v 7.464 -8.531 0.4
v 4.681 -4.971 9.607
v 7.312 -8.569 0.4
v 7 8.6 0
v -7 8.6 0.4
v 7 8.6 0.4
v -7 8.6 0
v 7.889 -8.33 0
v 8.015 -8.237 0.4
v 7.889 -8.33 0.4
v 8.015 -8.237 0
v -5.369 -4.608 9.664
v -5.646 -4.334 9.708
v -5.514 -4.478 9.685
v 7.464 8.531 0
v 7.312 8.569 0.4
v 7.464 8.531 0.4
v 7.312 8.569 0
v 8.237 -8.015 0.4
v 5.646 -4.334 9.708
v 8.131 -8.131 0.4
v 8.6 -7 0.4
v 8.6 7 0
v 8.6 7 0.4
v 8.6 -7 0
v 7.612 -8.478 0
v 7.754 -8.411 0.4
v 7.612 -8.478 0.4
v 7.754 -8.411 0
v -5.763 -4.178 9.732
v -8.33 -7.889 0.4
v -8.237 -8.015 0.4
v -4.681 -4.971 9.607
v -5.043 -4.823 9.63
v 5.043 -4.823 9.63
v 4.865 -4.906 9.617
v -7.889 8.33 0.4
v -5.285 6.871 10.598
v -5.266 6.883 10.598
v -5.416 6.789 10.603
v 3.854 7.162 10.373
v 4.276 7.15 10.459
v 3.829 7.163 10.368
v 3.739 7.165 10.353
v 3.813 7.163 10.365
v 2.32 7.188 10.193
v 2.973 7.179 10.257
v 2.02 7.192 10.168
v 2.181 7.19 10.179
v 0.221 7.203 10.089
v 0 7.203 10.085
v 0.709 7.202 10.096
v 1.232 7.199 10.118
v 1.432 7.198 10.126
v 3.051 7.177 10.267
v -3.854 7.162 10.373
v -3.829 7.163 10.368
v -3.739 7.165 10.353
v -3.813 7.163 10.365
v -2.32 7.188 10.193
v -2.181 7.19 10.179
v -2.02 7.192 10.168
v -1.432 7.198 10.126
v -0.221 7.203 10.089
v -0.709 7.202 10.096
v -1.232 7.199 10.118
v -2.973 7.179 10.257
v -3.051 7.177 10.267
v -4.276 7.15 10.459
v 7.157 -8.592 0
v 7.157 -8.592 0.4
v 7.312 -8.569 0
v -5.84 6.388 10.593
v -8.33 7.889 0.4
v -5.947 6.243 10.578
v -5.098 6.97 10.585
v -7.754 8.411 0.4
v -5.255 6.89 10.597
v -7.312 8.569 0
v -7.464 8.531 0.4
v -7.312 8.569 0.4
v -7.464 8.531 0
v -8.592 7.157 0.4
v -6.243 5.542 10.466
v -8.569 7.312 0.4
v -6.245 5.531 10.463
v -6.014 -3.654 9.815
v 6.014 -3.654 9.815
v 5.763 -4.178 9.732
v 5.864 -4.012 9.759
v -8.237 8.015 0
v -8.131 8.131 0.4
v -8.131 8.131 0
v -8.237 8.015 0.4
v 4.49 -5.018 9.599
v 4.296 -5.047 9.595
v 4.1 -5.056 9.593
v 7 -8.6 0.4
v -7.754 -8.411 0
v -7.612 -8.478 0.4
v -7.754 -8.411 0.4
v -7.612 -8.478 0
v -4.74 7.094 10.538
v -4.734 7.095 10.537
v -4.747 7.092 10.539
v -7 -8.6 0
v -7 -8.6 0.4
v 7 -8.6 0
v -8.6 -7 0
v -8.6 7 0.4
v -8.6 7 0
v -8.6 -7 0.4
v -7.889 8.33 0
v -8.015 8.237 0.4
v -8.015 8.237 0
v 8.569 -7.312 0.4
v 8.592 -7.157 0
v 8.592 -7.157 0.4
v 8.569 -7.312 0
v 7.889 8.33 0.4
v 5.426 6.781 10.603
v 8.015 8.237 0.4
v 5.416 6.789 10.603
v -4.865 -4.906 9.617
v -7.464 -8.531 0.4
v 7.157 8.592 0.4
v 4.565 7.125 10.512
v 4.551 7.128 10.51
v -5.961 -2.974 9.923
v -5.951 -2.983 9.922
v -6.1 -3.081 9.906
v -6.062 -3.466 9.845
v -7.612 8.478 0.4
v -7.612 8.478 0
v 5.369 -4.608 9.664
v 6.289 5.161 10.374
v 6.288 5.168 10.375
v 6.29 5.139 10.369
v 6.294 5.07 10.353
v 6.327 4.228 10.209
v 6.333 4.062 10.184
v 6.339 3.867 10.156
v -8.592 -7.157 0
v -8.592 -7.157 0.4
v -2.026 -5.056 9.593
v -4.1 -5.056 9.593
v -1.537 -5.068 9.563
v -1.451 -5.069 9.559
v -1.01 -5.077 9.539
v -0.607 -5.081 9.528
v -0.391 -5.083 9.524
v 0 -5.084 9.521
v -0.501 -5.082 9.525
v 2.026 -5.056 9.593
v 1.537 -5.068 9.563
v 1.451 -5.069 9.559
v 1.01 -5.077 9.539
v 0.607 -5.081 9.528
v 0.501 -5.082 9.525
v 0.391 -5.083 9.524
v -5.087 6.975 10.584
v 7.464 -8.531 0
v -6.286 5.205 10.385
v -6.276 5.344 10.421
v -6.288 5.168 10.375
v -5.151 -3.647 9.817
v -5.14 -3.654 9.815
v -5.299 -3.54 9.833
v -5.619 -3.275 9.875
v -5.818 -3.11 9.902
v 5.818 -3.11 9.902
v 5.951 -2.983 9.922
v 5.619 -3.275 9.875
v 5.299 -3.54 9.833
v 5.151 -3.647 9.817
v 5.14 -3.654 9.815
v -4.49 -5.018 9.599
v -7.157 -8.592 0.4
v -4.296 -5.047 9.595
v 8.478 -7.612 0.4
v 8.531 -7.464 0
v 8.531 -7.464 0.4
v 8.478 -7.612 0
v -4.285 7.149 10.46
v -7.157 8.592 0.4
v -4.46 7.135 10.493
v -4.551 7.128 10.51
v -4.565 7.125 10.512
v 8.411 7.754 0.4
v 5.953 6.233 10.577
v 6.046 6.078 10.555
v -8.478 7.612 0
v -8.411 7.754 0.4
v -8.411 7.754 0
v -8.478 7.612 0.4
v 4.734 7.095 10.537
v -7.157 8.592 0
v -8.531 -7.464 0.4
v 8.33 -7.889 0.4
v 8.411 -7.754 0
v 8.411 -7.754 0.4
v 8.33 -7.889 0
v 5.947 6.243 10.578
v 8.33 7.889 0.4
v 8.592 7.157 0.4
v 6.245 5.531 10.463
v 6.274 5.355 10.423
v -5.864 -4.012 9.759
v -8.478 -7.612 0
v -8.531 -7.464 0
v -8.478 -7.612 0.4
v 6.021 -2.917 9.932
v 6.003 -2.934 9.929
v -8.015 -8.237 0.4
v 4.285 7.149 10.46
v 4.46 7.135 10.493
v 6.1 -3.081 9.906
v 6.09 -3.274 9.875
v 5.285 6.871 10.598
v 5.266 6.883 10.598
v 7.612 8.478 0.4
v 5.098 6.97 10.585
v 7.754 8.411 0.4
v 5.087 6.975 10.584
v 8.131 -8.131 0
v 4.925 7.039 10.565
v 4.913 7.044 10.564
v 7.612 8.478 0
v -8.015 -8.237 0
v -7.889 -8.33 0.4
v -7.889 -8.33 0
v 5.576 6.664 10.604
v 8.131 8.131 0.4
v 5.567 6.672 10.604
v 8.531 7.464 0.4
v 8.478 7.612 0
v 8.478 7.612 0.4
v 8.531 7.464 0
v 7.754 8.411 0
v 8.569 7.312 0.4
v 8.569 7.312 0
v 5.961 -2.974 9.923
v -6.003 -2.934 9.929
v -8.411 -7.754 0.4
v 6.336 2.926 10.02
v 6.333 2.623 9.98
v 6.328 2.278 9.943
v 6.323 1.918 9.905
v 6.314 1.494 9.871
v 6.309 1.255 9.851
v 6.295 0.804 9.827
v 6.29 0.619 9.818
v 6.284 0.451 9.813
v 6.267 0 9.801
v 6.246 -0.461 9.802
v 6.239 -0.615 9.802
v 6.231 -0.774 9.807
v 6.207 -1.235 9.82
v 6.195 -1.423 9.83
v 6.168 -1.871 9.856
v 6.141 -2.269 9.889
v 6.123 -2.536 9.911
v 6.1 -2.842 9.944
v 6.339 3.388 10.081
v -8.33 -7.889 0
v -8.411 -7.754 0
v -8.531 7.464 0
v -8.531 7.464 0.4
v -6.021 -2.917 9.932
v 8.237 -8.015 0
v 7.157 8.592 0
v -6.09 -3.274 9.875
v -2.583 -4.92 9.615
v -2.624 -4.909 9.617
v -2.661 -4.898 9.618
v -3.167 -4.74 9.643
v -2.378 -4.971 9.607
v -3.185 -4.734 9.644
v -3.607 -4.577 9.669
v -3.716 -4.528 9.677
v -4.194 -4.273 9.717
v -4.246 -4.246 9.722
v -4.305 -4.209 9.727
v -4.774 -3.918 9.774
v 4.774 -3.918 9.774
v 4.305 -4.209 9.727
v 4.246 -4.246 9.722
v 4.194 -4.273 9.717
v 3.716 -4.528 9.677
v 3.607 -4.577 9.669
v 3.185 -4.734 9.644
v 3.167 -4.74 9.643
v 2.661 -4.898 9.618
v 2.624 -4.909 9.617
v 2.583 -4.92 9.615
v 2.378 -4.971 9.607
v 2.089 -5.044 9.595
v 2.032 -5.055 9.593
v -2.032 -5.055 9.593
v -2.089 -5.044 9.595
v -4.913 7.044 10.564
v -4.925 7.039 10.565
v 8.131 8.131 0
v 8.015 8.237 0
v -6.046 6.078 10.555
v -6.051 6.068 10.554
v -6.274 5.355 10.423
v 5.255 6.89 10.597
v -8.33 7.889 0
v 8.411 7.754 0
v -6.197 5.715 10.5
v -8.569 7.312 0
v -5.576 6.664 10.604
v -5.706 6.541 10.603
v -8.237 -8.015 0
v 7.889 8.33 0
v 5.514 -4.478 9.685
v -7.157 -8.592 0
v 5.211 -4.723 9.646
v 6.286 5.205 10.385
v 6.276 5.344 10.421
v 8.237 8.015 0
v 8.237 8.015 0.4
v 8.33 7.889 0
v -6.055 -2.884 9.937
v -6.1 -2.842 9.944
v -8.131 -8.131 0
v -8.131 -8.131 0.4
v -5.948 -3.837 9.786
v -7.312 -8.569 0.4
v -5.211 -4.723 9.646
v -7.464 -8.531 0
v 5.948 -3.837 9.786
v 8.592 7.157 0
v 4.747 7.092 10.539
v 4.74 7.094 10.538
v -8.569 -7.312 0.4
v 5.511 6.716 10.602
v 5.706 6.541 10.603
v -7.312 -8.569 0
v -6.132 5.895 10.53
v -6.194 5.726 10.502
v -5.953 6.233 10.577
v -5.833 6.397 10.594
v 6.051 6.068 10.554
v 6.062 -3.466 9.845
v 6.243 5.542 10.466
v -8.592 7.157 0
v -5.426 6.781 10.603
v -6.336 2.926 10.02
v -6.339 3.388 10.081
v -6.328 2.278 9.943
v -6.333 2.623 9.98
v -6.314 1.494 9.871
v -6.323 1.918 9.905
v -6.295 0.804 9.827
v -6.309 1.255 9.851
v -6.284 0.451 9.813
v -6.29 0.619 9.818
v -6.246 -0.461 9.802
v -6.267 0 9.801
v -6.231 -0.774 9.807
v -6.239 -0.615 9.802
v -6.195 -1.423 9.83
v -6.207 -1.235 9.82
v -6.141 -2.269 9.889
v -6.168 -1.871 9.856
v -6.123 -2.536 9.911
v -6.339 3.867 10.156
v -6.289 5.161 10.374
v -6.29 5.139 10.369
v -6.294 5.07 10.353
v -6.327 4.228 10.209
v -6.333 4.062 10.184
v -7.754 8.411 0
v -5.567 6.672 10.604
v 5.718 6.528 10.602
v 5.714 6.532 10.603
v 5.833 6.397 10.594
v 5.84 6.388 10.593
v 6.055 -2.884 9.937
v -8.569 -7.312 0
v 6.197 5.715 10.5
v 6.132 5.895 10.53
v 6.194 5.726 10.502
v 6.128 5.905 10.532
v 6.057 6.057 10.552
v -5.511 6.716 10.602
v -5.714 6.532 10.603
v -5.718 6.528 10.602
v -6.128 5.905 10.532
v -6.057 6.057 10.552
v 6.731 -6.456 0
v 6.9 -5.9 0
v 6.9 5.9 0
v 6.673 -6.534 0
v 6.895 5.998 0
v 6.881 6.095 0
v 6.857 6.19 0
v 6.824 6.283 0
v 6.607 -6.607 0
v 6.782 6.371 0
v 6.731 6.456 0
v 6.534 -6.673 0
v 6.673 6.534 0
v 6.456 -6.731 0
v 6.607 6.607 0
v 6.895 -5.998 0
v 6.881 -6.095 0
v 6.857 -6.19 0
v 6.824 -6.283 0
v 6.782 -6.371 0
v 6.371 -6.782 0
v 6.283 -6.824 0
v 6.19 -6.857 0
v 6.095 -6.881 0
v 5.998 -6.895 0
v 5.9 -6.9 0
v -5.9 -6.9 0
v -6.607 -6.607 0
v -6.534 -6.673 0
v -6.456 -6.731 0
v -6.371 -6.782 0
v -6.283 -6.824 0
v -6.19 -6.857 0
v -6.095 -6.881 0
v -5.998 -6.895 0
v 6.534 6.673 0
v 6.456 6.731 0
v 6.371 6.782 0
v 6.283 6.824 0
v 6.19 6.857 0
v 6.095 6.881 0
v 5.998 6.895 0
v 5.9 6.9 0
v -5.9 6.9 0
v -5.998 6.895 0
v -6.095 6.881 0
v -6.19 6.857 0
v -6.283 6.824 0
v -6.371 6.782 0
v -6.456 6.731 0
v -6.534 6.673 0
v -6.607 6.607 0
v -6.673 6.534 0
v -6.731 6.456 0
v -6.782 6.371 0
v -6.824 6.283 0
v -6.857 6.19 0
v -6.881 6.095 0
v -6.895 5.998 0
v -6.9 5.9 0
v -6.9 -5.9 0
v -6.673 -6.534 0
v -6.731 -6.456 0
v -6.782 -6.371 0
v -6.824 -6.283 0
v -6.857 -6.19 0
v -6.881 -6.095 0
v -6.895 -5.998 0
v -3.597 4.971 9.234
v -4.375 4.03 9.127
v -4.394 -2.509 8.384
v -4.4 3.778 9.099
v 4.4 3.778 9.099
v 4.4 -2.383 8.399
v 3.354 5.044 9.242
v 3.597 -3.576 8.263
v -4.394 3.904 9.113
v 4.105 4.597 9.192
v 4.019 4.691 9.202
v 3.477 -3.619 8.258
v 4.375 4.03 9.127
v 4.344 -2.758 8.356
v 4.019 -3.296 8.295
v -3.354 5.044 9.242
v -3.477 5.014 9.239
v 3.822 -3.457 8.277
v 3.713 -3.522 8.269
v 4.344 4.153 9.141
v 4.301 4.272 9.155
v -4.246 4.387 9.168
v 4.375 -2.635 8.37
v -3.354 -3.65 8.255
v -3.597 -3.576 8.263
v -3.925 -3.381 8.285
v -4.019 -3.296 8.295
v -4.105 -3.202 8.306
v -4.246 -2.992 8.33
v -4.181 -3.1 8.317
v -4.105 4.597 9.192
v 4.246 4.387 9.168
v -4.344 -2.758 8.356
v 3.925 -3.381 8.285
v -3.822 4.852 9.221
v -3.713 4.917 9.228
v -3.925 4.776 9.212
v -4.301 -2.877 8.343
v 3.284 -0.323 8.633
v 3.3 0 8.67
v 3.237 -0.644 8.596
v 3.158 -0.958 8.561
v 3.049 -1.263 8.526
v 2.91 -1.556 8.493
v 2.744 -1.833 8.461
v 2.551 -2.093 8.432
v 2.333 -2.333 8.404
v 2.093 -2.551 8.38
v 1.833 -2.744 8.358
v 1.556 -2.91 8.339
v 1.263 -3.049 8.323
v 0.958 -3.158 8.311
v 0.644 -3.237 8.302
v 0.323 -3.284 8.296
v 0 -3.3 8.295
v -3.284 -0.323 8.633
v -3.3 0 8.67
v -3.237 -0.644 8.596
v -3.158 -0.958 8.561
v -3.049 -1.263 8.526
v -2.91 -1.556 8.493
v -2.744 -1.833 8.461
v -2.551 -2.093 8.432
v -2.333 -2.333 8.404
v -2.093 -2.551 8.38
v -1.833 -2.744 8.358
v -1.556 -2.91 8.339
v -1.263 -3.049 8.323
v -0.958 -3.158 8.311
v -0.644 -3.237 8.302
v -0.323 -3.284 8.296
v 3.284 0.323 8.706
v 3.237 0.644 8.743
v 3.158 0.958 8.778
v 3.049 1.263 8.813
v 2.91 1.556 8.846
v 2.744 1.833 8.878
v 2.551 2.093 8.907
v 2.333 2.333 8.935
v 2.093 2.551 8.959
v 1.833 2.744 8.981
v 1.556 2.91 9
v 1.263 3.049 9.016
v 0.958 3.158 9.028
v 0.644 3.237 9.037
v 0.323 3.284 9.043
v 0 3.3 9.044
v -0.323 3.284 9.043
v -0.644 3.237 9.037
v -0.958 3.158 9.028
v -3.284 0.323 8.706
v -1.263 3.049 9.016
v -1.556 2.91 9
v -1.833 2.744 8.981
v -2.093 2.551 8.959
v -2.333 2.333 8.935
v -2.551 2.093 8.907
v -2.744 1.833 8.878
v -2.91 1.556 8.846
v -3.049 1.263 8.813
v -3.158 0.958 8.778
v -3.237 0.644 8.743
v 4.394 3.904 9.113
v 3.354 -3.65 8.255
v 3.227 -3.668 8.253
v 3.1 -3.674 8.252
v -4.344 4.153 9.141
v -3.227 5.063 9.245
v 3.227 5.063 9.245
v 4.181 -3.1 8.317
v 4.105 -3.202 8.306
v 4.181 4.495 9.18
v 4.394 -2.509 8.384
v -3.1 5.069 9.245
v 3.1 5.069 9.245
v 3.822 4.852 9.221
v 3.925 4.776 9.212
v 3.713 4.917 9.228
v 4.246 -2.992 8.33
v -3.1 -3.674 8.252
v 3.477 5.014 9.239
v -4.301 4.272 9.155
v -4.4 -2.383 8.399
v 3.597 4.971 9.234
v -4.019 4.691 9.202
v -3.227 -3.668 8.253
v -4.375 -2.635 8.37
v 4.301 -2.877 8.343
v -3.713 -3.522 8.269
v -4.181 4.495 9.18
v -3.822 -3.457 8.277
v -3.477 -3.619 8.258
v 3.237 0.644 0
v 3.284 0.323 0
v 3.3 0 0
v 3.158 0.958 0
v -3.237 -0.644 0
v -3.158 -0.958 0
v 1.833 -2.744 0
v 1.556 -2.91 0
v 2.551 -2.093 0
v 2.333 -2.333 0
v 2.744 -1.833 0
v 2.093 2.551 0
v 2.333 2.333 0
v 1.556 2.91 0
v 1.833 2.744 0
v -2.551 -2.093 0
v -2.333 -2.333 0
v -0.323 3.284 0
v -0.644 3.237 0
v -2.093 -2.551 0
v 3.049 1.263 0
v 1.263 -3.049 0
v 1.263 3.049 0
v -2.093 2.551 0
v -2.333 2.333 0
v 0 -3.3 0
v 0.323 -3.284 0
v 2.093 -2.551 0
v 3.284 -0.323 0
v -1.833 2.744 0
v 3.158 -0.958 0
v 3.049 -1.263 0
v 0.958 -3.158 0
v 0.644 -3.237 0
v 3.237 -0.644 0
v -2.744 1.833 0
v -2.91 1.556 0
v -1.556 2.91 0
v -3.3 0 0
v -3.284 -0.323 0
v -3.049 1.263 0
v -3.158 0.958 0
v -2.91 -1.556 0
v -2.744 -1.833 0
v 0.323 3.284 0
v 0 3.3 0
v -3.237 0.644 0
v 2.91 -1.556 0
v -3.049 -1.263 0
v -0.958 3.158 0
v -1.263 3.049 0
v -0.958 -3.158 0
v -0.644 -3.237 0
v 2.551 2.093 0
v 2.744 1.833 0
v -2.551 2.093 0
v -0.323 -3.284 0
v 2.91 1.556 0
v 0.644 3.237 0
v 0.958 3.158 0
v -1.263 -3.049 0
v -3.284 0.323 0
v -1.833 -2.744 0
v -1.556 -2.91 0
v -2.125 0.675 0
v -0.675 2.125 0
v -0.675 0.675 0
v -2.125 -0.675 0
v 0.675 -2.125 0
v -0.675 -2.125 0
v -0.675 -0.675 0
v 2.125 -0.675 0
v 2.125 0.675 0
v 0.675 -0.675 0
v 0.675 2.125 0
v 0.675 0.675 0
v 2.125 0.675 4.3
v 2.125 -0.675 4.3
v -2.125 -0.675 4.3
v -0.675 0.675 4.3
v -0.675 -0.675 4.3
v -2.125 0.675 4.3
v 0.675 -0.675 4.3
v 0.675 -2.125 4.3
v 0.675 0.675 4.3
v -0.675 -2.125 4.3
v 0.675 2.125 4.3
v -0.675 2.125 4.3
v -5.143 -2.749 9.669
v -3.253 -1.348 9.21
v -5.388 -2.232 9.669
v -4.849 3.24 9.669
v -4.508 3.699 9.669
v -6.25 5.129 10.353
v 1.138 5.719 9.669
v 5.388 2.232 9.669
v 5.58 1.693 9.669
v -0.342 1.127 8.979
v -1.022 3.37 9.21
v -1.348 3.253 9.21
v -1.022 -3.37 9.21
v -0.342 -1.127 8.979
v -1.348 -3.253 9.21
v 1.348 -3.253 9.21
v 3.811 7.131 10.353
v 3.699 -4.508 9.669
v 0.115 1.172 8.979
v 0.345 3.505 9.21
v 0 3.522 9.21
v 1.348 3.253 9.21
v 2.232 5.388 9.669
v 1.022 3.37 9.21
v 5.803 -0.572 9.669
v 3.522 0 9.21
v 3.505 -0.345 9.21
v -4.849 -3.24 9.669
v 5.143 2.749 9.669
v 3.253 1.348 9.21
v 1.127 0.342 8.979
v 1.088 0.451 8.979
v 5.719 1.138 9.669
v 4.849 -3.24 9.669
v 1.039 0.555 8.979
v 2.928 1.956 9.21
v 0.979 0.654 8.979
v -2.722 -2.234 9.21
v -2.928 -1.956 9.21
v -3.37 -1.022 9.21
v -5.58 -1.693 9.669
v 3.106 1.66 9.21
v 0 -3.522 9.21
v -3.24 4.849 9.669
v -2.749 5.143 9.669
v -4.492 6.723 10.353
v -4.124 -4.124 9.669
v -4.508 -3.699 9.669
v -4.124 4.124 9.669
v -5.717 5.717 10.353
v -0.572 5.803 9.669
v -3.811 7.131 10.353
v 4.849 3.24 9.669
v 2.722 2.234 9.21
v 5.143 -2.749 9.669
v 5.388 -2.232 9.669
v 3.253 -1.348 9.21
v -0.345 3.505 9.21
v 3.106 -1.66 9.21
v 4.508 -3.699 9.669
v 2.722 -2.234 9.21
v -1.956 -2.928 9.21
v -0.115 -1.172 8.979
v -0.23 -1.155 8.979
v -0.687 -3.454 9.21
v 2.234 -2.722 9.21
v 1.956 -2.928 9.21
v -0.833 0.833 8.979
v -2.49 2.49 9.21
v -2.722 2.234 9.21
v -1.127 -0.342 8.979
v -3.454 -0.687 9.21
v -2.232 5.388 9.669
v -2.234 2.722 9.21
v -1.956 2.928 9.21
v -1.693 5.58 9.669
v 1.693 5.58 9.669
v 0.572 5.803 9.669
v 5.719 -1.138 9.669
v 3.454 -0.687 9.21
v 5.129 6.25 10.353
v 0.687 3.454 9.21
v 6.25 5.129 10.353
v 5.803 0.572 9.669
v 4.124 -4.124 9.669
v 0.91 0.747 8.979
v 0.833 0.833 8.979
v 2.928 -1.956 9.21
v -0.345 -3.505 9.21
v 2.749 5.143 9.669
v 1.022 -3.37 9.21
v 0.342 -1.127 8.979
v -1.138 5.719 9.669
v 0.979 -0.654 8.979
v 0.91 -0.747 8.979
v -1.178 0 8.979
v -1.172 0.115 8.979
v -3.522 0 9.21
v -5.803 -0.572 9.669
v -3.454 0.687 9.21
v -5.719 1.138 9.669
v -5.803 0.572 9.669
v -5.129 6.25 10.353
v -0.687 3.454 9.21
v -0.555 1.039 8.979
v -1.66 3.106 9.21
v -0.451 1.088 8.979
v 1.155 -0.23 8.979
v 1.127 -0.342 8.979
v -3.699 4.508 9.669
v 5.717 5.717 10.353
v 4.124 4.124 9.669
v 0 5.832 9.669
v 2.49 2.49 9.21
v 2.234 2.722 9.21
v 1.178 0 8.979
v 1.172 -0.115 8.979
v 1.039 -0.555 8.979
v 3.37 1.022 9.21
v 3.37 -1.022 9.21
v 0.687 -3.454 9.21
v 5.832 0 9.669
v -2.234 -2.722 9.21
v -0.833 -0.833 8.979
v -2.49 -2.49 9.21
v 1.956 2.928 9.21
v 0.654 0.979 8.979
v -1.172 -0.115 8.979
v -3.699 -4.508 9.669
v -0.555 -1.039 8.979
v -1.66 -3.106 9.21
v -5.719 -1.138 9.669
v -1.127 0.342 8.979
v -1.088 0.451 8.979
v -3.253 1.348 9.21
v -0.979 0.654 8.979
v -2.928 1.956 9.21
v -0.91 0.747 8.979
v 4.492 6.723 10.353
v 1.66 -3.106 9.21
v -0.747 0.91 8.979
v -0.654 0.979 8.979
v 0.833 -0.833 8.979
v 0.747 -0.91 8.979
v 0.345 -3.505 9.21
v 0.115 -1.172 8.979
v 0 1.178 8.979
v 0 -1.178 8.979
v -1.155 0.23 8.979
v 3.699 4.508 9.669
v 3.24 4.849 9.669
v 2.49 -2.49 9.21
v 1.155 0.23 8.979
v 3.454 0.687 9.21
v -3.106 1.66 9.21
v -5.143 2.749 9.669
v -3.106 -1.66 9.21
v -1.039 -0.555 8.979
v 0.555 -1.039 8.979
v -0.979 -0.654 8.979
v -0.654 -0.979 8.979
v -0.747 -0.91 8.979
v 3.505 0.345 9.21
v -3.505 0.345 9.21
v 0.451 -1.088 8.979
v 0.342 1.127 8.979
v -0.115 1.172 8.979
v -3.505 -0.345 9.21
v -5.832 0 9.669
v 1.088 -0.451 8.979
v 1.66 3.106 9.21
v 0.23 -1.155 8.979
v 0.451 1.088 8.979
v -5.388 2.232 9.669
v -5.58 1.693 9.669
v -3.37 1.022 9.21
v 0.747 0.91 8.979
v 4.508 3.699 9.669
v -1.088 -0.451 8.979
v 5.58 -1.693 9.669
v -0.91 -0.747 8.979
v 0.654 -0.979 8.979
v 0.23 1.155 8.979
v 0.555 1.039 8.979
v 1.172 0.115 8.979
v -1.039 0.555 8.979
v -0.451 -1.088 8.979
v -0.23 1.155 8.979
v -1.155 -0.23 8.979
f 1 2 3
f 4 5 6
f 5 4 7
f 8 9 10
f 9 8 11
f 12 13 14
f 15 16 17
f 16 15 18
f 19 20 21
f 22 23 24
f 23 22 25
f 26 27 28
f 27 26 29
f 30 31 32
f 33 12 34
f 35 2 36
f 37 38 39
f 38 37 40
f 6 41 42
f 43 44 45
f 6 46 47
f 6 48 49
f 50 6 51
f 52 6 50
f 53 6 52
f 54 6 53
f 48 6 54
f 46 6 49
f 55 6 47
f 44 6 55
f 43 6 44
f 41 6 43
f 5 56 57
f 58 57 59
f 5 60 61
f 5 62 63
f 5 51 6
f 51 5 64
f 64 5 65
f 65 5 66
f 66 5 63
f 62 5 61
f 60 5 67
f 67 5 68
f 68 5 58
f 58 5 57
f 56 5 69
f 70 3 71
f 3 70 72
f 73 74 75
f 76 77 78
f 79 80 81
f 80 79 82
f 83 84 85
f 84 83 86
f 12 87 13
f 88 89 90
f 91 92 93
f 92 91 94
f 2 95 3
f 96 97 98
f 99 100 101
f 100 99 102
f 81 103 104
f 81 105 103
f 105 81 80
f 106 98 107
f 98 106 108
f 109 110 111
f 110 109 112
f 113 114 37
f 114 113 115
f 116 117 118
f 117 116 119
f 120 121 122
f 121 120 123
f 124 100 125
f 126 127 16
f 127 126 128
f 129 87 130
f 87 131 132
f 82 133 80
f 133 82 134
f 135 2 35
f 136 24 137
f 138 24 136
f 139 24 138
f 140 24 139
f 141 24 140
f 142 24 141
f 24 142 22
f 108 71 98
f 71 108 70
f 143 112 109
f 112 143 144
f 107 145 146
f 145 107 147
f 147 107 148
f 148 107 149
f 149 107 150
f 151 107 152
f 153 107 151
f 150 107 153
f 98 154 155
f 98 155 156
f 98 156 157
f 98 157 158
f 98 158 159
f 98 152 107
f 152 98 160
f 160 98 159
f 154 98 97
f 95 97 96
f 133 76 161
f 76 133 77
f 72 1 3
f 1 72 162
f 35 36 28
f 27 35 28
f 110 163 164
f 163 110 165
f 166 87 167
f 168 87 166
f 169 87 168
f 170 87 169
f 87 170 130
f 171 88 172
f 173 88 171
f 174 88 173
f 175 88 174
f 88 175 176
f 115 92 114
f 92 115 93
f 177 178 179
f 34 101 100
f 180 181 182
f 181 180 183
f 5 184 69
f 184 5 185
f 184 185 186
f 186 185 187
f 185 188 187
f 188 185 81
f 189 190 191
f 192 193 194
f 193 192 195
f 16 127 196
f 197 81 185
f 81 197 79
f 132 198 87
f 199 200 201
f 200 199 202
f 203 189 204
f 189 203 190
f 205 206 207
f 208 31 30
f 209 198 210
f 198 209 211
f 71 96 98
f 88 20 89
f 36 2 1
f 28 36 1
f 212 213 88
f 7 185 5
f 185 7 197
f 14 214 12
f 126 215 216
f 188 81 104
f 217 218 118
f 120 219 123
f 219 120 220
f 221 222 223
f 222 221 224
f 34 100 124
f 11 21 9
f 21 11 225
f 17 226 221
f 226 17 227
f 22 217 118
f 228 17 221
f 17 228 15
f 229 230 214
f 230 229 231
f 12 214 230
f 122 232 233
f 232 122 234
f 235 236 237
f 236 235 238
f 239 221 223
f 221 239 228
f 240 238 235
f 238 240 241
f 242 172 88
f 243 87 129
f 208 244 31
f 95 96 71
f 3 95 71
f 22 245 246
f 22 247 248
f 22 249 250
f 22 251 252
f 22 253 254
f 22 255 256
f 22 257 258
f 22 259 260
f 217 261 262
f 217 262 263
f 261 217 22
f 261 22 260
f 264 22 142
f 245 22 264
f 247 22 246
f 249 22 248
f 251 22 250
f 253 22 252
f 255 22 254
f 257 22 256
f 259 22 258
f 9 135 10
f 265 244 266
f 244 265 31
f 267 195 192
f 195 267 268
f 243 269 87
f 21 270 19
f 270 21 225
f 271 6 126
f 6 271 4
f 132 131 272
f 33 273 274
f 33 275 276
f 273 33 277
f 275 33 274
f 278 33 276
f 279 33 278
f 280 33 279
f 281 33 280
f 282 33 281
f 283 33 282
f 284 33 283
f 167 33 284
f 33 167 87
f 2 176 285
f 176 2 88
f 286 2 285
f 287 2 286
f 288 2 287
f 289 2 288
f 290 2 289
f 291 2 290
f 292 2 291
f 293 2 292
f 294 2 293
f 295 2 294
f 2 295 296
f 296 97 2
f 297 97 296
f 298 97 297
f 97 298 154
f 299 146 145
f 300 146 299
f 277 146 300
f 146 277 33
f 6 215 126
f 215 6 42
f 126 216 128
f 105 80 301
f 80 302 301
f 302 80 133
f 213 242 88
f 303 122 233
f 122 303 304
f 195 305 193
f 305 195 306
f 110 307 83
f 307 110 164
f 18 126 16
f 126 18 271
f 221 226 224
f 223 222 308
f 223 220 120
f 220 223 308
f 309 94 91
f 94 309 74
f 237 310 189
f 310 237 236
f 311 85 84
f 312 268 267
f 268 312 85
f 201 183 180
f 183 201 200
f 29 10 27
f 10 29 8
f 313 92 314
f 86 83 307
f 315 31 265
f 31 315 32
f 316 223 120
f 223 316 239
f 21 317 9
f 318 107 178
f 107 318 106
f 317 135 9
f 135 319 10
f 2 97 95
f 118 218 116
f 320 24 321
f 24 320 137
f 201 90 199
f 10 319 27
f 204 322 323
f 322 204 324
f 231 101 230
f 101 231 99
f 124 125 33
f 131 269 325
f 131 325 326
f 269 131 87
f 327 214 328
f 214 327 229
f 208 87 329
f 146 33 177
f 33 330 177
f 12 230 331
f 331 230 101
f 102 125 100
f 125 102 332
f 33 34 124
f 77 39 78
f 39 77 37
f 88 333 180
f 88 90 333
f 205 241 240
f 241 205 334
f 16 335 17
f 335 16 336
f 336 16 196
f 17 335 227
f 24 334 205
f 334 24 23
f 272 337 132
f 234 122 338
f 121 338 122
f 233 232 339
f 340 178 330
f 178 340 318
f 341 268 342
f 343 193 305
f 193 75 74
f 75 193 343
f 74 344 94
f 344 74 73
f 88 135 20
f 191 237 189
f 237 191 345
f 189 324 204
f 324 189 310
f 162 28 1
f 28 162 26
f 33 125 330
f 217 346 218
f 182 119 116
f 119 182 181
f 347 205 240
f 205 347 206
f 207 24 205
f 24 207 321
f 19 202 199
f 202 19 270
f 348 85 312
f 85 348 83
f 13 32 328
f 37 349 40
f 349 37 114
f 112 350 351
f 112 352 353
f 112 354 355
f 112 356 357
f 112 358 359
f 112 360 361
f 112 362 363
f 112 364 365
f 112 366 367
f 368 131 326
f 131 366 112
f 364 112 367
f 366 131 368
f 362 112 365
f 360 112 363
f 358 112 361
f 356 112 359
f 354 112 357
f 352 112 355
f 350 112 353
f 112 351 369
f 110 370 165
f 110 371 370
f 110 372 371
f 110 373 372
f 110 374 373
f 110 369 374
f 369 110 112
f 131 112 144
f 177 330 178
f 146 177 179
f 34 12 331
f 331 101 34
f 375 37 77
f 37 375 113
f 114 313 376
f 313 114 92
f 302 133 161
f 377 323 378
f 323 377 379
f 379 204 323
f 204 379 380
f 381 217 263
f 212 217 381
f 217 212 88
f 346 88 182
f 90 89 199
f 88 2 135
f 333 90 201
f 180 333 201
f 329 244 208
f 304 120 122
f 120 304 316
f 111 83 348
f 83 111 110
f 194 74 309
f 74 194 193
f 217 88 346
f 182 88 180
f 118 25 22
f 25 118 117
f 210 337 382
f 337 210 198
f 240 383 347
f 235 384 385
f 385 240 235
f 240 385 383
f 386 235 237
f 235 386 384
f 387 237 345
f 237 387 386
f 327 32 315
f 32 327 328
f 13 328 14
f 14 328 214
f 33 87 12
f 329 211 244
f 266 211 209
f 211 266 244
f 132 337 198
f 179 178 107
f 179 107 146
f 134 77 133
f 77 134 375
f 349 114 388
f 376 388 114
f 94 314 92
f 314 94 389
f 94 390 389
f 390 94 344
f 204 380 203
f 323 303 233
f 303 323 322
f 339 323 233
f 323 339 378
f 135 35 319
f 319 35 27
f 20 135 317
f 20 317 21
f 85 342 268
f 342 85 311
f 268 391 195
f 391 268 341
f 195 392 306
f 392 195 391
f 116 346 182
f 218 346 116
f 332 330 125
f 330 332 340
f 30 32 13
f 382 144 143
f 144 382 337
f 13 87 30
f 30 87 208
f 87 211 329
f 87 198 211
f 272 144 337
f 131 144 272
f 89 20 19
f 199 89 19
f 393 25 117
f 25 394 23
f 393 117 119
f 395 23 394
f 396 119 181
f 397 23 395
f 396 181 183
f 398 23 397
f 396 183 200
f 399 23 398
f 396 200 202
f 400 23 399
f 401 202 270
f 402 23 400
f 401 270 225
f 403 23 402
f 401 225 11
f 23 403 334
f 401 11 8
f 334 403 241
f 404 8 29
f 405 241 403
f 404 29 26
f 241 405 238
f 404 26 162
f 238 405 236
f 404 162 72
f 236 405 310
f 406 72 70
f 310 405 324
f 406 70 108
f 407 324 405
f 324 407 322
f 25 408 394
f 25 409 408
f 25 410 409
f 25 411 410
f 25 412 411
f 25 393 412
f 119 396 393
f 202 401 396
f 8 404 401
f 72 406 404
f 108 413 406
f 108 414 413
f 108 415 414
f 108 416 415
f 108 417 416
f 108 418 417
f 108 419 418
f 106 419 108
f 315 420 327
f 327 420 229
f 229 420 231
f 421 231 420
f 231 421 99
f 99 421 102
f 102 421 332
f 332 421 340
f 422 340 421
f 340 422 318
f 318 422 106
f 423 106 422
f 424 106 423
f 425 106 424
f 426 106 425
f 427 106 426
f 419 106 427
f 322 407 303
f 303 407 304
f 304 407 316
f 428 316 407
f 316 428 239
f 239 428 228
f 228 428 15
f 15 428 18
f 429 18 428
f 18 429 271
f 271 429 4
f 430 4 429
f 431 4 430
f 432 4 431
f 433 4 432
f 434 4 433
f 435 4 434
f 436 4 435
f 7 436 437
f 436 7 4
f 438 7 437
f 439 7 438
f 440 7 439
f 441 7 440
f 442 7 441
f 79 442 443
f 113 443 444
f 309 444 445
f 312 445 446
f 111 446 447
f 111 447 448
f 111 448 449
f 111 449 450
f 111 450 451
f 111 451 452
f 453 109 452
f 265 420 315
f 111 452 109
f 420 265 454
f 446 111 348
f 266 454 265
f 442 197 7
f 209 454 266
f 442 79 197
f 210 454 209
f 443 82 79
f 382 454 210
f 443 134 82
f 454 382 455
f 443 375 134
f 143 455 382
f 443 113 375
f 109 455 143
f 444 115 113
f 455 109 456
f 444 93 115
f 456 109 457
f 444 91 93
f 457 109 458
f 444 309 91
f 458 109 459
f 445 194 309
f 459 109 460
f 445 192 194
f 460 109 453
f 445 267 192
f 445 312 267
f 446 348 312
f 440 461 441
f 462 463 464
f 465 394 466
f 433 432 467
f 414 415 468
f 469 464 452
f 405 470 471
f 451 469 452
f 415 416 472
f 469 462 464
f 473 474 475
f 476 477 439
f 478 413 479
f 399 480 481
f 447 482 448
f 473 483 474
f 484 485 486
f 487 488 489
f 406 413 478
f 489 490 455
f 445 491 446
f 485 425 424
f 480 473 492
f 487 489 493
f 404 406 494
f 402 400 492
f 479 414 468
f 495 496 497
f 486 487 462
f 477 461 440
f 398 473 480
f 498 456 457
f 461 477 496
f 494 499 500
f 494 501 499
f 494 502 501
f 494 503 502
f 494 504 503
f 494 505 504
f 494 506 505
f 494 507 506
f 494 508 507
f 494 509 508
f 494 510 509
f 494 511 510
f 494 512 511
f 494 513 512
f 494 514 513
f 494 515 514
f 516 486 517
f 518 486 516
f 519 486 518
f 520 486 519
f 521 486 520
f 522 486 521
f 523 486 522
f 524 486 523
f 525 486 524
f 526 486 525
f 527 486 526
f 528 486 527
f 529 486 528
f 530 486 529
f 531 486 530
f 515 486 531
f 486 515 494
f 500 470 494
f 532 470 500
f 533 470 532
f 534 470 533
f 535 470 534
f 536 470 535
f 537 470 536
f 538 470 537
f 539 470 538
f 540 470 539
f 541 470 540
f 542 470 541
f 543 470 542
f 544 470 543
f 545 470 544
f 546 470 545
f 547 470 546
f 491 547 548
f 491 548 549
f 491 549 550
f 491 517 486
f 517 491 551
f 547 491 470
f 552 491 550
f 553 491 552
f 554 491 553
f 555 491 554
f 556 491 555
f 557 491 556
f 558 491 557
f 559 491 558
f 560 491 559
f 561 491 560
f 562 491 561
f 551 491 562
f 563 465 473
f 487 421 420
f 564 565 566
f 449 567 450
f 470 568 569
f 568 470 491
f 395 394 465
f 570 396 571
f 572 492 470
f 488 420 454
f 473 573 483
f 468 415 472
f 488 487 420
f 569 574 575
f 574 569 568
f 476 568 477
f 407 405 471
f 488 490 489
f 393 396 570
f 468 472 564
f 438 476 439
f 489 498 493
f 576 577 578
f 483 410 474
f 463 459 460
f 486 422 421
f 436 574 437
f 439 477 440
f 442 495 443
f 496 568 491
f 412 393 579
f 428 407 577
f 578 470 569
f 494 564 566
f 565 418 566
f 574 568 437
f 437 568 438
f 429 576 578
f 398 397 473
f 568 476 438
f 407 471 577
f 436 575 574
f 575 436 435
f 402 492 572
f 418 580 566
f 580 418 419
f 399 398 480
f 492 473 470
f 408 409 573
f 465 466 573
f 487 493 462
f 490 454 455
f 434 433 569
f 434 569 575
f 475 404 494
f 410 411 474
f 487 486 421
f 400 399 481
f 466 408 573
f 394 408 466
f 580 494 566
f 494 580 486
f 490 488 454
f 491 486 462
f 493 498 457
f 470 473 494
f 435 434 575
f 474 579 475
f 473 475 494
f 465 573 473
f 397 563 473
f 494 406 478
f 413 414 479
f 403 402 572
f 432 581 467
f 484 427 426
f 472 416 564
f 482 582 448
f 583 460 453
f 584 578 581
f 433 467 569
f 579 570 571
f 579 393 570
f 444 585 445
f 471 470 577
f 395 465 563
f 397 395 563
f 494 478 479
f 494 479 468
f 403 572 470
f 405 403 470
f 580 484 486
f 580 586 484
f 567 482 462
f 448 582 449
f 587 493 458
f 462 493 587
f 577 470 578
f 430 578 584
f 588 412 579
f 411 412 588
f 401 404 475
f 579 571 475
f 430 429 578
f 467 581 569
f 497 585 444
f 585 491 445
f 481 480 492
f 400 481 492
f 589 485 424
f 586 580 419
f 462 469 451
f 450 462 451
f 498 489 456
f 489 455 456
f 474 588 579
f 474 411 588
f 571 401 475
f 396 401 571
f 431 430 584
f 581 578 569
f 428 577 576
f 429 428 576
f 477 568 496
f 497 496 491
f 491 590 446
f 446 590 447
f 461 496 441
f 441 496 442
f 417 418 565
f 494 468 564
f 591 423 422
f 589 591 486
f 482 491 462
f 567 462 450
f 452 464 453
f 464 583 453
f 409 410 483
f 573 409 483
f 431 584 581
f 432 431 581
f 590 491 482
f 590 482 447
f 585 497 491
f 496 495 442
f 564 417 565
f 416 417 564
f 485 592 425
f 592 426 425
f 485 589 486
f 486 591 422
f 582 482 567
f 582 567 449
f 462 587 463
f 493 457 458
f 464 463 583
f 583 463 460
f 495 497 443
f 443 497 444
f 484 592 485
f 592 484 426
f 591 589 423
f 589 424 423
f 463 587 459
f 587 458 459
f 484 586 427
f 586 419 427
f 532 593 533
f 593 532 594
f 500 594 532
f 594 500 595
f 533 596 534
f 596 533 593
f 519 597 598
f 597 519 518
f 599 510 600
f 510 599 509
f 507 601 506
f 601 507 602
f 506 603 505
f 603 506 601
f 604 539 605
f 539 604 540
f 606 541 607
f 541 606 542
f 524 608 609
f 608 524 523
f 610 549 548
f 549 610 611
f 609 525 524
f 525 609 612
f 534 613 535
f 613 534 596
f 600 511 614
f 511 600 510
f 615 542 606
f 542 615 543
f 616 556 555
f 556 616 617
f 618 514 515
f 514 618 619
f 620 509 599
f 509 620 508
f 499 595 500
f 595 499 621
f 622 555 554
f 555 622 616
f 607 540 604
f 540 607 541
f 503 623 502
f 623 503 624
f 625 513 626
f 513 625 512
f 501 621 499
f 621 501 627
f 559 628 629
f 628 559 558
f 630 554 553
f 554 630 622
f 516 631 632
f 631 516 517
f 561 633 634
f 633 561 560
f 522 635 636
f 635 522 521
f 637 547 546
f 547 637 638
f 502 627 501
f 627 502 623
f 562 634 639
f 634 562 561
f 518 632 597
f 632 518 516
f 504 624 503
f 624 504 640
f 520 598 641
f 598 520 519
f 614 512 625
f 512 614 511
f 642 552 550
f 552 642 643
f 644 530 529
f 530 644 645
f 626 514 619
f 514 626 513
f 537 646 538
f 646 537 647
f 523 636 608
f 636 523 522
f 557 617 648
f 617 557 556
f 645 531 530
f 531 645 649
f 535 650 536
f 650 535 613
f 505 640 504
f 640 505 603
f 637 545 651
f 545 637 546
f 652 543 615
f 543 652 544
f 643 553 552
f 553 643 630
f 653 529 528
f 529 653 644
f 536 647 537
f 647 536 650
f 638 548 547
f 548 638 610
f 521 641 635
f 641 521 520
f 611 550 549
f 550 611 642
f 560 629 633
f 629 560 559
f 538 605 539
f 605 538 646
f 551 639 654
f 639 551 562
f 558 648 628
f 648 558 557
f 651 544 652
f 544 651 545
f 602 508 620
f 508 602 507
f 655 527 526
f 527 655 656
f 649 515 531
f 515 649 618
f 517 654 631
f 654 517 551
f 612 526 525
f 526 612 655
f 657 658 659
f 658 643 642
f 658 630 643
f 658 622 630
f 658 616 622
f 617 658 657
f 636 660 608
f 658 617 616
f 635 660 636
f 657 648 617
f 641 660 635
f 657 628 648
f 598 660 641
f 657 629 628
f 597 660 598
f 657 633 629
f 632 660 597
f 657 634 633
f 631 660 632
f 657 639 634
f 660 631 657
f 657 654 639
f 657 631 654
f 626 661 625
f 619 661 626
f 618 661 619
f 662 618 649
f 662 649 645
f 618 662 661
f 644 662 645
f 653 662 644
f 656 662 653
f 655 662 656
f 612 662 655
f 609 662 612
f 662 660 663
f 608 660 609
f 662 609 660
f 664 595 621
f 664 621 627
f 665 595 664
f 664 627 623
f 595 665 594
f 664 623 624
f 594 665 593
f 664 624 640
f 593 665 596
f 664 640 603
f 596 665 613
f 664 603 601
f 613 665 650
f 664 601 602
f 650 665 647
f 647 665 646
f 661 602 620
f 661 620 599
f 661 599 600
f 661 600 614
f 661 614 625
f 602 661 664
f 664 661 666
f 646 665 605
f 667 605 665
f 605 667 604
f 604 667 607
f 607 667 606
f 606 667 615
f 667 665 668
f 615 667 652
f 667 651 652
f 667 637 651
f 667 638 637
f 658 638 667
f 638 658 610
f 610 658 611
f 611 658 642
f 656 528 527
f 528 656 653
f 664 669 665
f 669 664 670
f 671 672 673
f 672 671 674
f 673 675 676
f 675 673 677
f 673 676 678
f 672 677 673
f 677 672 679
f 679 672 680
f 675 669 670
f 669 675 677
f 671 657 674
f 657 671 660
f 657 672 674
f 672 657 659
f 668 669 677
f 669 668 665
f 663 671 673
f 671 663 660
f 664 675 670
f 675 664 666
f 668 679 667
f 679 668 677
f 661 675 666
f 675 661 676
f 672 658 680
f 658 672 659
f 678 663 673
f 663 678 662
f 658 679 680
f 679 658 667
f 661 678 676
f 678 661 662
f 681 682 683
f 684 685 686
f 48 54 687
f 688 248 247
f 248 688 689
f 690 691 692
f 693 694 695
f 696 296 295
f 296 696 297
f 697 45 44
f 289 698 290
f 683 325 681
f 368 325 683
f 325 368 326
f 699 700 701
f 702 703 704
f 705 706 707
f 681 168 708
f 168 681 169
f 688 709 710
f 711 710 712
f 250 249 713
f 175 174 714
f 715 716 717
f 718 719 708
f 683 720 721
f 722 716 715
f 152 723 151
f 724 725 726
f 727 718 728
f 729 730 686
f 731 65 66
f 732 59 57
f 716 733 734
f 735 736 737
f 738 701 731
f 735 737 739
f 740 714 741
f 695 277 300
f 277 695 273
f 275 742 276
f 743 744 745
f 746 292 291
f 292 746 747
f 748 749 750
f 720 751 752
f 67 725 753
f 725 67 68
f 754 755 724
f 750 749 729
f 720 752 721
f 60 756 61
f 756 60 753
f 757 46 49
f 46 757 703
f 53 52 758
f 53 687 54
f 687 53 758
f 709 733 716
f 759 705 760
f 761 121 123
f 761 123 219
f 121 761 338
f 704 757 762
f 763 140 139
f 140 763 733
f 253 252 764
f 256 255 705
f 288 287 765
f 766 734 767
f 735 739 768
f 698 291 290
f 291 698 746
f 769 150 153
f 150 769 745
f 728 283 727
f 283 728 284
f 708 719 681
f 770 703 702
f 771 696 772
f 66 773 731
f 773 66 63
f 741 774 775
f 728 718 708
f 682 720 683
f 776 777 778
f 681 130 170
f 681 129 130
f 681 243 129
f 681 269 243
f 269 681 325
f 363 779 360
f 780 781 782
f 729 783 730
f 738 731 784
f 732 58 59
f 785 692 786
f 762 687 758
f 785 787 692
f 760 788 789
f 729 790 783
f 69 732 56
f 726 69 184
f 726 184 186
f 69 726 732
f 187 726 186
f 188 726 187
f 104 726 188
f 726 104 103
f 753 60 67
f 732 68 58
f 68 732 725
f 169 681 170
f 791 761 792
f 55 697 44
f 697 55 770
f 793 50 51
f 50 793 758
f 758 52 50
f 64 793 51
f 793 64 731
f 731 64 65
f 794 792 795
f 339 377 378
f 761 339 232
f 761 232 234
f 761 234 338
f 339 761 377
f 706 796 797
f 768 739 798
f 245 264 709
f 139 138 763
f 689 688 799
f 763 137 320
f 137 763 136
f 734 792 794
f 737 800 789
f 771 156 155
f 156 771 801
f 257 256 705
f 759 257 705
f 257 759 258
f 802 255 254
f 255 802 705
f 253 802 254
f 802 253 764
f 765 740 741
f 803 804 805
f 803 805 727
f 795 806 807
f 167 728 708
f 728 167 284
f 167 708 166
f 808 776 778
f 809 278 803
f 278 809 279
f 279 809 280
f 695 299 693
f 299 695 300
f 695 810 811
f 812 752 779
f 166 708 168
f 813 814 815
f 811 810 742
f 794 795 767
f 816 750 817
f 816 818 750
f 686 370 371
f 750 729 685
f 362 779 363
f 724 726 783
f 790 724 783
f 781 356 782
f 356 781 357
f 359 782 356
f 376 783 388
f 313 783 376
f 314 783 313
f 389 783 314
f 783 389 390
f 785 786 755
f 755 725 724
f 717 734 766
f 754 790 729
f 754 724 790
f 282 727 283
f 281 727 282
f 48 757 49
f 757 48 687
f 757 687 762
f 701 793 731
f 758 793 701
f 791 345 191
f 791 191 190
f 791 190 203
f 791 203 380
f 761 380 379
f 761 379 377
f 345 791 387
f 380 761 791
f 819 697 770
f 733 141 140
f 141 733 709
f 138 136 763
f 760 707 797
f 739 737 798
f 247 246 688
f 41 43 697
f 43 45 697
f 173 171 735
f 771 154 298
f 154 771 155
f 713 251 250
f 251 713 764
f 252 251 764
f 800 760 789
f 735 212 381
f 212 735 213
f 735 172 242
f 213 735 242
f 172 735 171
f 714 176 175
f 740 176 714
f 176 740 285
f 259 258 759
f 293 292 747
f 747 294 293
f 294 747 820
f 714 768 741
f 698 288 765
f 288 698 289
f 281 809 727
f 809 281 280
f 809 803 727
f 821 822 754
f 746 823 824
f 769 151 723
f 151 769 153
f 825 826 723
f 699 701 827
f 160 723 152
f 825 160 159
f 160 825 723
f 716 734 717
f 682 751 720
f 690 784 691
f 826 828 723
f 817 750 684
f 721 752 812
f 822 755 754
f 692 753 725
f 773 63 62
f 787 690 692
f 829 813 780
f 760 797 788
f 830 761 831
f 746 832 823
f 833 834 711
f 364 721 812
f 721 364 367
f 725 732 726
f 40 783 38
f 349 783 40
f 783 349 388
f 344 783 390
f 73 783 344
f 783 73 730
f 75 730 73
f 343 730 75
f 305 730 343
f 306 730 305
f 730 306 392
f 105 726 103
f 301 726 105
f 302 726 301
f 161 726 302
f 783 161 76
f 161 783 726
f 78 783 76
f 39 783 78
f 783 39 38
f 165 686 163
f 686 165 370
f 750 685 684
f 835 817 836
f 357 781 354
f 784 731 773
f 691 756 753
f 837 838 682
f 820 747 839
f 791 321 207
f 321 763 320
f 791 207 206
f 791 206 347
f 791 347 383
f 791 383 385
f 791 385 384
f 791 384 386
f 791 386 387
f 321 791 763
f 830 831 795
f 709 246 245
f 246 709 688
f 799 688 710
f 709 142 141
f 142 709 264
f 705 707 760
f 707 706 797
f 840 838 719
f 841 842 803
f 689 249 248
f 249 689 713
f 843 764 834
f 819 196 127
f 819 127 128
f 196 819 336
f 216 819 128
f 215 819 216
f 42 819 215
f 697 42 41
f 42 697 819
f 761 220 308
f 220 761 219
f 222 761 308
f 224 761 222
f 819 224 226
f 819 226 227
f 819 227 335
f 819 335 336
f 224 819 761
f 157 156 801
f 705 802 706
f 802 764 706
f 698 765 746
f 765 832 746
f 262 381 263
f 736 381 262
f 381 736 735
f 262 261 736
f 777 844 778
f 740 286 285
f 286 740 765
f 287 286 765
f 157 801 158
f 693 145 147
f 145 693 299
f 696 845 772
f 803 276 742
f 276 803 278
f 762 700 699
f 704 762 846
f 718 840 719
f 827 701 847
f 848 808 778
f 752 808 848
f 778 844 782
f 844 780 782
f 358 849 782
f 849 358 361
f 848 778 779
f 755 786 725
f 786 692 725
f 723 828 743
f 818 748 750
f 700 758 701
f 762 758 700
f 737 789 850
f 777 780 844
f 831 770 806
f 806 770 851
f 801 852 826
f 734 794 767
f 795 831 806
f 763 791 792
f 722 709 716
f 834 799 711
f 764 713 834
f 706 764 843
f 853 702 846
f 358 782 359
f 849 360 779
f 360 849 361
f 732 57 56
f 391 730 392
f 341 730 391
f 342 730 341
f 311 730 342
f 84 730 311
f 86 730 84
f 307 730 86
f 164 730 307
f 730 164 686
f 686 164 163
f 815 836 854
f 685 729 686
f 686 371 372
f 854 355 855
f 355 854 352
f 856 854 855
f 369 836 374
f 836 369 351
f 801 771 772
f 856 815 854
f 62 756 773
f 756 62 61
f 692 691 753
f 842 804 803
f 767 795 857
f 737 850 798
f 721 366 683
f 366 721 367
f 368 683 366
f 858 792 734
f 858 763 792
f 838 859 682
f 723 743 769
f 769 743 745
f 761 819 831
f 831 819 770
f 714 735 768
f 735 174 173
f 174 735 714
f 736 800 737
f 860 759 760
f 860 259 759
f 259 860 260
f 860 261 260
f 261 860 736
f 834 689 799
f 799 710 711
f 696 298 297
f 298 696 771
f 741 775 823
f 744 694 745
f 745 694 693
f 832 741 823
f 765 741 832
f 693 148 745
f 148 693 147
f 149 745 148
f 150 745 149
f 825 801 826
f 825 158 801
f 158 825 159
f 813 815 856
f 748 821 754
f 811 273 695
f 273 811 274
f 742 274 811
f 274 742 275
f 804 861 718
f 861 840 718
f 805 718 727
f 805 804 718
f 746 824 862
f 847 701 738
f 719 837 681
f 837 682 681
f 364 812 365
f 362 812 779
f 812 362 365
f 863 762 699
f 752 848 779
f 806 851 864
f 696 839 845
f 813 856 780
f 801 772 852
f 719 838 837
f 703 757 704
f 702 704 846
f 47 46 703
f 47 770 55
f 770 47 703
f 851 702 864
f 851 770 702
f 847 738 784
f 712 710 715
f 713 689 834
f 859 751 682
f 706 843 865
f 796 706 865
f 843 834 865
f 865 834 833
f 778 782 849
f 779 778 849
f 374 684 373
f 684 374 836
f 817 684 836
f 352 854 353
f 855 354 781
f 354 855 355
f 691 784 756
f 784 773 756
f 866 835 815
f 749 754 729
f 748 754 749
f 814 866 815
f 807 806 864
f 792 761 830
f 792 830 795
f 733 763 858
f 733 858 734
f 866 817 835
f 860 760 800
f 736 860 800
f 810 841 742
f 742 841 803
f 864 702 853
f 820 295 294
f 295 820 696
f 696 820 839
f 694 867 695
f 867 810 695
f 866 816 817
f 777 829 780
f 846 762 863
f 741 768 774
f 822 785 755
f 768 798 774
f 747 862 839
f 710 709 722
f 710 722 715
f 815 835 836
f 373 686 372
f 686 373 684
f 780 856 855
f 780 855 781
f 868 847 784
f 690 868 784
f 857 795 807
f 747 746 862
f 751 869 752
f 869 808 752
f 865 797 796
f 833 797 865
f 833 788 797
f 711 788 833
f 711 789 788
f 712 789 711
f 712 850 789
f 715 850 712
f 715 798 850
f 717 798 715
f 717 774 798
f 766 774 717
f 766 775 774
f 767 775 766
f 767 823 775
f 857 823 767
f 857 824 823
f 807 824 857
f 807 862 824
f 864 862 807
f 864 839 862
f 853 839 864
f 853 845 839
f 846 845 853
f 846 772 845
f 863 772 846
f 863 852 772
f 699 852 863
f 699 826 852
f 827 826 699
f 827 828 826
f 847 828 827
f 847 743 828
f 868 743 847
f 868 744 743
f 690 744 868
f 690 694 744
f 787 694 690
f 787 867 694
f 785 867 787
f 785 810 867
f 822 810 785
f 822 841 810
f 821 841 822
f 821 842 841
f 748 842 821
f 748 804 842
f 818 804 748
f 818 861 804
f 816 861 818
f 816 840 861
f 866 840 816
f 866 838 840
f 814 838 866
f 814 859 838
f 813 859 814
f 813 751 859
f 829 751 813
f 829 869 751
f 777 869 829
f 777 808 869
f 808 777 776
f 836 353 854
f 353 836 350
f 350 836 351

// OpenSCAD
$fn=64;
profile="top";

module rr2d(w,d,r){ offset(r=r) square([w-2*r,d-2*r],center=true); }
module slab(w,d,r,z,shift=0,ang=0,t=0.35){
  translate([0,shift,z]) rotate([ang,0,0]) linear_extrude(height=t,center=true) rr2d(w,d,r);
}
module frustum(bw,bd,tw,td,br,tr,h,shift,ang){
  hull(){ slab(bw,bd,br,0.2,0,0,0.4); slab(tw,td,tr,h-0.2,shift,ang,0.4); }
}
module cross_slot(len=4.25,th=1.35,h=5){
 union(){cube([len,th,h],center=true); cube([th,len,h],center=true);} }
module keycap(h=10.5,ang=9,shift=1.1,dish=1.5,saddle=false){
  bw=17.2; bd=17.2; tw=12.2; td=12.2;
  wall=1.7; topth=2.0;
  difference(){
    union(){
      difference(){
        frustum(bw,bd,tw,td,1.6,2.0,h,shift,ang);
        translate([0,0,-0.4]) frustum(bw-2*wall,bd-2*wall,tw-2*wall,td-2*wall,1.0,1.3,h-topth+0.6,shift*0.72,ang*0.72);
      }
      // MX stem boss attached to roof
      cylinder(d=6.6,h=h-topth+0.7);
    }
    // dish cut
    if(saddle){
      translate([0,0,h+18-dish]) rotate([0,90,0]) cylinder(r=18,h=40,center=true);
    } else {
      translate([0,0,h+24-dish]) sphere(r=24);
    }
    // female MX cross
    translate([0,0,2.0]) cross_slot(4.25,1.35,4.6);
  }
}
if(profile=="top") keycap(h=10.55,ang=9,shift=1.0,dish=1.6);
if(profile=="home") keycap(h=8.75,ang=4,shift=.5,dish=1.7);
if(profile=="bottom") keycap(h=9.75,ang=-13,shift=-1.2,dish=1.6);
if(profile=="thumb") keycap(h=8.4,ang=-3,shift=-.3,dish=1.8,saddle=true);
